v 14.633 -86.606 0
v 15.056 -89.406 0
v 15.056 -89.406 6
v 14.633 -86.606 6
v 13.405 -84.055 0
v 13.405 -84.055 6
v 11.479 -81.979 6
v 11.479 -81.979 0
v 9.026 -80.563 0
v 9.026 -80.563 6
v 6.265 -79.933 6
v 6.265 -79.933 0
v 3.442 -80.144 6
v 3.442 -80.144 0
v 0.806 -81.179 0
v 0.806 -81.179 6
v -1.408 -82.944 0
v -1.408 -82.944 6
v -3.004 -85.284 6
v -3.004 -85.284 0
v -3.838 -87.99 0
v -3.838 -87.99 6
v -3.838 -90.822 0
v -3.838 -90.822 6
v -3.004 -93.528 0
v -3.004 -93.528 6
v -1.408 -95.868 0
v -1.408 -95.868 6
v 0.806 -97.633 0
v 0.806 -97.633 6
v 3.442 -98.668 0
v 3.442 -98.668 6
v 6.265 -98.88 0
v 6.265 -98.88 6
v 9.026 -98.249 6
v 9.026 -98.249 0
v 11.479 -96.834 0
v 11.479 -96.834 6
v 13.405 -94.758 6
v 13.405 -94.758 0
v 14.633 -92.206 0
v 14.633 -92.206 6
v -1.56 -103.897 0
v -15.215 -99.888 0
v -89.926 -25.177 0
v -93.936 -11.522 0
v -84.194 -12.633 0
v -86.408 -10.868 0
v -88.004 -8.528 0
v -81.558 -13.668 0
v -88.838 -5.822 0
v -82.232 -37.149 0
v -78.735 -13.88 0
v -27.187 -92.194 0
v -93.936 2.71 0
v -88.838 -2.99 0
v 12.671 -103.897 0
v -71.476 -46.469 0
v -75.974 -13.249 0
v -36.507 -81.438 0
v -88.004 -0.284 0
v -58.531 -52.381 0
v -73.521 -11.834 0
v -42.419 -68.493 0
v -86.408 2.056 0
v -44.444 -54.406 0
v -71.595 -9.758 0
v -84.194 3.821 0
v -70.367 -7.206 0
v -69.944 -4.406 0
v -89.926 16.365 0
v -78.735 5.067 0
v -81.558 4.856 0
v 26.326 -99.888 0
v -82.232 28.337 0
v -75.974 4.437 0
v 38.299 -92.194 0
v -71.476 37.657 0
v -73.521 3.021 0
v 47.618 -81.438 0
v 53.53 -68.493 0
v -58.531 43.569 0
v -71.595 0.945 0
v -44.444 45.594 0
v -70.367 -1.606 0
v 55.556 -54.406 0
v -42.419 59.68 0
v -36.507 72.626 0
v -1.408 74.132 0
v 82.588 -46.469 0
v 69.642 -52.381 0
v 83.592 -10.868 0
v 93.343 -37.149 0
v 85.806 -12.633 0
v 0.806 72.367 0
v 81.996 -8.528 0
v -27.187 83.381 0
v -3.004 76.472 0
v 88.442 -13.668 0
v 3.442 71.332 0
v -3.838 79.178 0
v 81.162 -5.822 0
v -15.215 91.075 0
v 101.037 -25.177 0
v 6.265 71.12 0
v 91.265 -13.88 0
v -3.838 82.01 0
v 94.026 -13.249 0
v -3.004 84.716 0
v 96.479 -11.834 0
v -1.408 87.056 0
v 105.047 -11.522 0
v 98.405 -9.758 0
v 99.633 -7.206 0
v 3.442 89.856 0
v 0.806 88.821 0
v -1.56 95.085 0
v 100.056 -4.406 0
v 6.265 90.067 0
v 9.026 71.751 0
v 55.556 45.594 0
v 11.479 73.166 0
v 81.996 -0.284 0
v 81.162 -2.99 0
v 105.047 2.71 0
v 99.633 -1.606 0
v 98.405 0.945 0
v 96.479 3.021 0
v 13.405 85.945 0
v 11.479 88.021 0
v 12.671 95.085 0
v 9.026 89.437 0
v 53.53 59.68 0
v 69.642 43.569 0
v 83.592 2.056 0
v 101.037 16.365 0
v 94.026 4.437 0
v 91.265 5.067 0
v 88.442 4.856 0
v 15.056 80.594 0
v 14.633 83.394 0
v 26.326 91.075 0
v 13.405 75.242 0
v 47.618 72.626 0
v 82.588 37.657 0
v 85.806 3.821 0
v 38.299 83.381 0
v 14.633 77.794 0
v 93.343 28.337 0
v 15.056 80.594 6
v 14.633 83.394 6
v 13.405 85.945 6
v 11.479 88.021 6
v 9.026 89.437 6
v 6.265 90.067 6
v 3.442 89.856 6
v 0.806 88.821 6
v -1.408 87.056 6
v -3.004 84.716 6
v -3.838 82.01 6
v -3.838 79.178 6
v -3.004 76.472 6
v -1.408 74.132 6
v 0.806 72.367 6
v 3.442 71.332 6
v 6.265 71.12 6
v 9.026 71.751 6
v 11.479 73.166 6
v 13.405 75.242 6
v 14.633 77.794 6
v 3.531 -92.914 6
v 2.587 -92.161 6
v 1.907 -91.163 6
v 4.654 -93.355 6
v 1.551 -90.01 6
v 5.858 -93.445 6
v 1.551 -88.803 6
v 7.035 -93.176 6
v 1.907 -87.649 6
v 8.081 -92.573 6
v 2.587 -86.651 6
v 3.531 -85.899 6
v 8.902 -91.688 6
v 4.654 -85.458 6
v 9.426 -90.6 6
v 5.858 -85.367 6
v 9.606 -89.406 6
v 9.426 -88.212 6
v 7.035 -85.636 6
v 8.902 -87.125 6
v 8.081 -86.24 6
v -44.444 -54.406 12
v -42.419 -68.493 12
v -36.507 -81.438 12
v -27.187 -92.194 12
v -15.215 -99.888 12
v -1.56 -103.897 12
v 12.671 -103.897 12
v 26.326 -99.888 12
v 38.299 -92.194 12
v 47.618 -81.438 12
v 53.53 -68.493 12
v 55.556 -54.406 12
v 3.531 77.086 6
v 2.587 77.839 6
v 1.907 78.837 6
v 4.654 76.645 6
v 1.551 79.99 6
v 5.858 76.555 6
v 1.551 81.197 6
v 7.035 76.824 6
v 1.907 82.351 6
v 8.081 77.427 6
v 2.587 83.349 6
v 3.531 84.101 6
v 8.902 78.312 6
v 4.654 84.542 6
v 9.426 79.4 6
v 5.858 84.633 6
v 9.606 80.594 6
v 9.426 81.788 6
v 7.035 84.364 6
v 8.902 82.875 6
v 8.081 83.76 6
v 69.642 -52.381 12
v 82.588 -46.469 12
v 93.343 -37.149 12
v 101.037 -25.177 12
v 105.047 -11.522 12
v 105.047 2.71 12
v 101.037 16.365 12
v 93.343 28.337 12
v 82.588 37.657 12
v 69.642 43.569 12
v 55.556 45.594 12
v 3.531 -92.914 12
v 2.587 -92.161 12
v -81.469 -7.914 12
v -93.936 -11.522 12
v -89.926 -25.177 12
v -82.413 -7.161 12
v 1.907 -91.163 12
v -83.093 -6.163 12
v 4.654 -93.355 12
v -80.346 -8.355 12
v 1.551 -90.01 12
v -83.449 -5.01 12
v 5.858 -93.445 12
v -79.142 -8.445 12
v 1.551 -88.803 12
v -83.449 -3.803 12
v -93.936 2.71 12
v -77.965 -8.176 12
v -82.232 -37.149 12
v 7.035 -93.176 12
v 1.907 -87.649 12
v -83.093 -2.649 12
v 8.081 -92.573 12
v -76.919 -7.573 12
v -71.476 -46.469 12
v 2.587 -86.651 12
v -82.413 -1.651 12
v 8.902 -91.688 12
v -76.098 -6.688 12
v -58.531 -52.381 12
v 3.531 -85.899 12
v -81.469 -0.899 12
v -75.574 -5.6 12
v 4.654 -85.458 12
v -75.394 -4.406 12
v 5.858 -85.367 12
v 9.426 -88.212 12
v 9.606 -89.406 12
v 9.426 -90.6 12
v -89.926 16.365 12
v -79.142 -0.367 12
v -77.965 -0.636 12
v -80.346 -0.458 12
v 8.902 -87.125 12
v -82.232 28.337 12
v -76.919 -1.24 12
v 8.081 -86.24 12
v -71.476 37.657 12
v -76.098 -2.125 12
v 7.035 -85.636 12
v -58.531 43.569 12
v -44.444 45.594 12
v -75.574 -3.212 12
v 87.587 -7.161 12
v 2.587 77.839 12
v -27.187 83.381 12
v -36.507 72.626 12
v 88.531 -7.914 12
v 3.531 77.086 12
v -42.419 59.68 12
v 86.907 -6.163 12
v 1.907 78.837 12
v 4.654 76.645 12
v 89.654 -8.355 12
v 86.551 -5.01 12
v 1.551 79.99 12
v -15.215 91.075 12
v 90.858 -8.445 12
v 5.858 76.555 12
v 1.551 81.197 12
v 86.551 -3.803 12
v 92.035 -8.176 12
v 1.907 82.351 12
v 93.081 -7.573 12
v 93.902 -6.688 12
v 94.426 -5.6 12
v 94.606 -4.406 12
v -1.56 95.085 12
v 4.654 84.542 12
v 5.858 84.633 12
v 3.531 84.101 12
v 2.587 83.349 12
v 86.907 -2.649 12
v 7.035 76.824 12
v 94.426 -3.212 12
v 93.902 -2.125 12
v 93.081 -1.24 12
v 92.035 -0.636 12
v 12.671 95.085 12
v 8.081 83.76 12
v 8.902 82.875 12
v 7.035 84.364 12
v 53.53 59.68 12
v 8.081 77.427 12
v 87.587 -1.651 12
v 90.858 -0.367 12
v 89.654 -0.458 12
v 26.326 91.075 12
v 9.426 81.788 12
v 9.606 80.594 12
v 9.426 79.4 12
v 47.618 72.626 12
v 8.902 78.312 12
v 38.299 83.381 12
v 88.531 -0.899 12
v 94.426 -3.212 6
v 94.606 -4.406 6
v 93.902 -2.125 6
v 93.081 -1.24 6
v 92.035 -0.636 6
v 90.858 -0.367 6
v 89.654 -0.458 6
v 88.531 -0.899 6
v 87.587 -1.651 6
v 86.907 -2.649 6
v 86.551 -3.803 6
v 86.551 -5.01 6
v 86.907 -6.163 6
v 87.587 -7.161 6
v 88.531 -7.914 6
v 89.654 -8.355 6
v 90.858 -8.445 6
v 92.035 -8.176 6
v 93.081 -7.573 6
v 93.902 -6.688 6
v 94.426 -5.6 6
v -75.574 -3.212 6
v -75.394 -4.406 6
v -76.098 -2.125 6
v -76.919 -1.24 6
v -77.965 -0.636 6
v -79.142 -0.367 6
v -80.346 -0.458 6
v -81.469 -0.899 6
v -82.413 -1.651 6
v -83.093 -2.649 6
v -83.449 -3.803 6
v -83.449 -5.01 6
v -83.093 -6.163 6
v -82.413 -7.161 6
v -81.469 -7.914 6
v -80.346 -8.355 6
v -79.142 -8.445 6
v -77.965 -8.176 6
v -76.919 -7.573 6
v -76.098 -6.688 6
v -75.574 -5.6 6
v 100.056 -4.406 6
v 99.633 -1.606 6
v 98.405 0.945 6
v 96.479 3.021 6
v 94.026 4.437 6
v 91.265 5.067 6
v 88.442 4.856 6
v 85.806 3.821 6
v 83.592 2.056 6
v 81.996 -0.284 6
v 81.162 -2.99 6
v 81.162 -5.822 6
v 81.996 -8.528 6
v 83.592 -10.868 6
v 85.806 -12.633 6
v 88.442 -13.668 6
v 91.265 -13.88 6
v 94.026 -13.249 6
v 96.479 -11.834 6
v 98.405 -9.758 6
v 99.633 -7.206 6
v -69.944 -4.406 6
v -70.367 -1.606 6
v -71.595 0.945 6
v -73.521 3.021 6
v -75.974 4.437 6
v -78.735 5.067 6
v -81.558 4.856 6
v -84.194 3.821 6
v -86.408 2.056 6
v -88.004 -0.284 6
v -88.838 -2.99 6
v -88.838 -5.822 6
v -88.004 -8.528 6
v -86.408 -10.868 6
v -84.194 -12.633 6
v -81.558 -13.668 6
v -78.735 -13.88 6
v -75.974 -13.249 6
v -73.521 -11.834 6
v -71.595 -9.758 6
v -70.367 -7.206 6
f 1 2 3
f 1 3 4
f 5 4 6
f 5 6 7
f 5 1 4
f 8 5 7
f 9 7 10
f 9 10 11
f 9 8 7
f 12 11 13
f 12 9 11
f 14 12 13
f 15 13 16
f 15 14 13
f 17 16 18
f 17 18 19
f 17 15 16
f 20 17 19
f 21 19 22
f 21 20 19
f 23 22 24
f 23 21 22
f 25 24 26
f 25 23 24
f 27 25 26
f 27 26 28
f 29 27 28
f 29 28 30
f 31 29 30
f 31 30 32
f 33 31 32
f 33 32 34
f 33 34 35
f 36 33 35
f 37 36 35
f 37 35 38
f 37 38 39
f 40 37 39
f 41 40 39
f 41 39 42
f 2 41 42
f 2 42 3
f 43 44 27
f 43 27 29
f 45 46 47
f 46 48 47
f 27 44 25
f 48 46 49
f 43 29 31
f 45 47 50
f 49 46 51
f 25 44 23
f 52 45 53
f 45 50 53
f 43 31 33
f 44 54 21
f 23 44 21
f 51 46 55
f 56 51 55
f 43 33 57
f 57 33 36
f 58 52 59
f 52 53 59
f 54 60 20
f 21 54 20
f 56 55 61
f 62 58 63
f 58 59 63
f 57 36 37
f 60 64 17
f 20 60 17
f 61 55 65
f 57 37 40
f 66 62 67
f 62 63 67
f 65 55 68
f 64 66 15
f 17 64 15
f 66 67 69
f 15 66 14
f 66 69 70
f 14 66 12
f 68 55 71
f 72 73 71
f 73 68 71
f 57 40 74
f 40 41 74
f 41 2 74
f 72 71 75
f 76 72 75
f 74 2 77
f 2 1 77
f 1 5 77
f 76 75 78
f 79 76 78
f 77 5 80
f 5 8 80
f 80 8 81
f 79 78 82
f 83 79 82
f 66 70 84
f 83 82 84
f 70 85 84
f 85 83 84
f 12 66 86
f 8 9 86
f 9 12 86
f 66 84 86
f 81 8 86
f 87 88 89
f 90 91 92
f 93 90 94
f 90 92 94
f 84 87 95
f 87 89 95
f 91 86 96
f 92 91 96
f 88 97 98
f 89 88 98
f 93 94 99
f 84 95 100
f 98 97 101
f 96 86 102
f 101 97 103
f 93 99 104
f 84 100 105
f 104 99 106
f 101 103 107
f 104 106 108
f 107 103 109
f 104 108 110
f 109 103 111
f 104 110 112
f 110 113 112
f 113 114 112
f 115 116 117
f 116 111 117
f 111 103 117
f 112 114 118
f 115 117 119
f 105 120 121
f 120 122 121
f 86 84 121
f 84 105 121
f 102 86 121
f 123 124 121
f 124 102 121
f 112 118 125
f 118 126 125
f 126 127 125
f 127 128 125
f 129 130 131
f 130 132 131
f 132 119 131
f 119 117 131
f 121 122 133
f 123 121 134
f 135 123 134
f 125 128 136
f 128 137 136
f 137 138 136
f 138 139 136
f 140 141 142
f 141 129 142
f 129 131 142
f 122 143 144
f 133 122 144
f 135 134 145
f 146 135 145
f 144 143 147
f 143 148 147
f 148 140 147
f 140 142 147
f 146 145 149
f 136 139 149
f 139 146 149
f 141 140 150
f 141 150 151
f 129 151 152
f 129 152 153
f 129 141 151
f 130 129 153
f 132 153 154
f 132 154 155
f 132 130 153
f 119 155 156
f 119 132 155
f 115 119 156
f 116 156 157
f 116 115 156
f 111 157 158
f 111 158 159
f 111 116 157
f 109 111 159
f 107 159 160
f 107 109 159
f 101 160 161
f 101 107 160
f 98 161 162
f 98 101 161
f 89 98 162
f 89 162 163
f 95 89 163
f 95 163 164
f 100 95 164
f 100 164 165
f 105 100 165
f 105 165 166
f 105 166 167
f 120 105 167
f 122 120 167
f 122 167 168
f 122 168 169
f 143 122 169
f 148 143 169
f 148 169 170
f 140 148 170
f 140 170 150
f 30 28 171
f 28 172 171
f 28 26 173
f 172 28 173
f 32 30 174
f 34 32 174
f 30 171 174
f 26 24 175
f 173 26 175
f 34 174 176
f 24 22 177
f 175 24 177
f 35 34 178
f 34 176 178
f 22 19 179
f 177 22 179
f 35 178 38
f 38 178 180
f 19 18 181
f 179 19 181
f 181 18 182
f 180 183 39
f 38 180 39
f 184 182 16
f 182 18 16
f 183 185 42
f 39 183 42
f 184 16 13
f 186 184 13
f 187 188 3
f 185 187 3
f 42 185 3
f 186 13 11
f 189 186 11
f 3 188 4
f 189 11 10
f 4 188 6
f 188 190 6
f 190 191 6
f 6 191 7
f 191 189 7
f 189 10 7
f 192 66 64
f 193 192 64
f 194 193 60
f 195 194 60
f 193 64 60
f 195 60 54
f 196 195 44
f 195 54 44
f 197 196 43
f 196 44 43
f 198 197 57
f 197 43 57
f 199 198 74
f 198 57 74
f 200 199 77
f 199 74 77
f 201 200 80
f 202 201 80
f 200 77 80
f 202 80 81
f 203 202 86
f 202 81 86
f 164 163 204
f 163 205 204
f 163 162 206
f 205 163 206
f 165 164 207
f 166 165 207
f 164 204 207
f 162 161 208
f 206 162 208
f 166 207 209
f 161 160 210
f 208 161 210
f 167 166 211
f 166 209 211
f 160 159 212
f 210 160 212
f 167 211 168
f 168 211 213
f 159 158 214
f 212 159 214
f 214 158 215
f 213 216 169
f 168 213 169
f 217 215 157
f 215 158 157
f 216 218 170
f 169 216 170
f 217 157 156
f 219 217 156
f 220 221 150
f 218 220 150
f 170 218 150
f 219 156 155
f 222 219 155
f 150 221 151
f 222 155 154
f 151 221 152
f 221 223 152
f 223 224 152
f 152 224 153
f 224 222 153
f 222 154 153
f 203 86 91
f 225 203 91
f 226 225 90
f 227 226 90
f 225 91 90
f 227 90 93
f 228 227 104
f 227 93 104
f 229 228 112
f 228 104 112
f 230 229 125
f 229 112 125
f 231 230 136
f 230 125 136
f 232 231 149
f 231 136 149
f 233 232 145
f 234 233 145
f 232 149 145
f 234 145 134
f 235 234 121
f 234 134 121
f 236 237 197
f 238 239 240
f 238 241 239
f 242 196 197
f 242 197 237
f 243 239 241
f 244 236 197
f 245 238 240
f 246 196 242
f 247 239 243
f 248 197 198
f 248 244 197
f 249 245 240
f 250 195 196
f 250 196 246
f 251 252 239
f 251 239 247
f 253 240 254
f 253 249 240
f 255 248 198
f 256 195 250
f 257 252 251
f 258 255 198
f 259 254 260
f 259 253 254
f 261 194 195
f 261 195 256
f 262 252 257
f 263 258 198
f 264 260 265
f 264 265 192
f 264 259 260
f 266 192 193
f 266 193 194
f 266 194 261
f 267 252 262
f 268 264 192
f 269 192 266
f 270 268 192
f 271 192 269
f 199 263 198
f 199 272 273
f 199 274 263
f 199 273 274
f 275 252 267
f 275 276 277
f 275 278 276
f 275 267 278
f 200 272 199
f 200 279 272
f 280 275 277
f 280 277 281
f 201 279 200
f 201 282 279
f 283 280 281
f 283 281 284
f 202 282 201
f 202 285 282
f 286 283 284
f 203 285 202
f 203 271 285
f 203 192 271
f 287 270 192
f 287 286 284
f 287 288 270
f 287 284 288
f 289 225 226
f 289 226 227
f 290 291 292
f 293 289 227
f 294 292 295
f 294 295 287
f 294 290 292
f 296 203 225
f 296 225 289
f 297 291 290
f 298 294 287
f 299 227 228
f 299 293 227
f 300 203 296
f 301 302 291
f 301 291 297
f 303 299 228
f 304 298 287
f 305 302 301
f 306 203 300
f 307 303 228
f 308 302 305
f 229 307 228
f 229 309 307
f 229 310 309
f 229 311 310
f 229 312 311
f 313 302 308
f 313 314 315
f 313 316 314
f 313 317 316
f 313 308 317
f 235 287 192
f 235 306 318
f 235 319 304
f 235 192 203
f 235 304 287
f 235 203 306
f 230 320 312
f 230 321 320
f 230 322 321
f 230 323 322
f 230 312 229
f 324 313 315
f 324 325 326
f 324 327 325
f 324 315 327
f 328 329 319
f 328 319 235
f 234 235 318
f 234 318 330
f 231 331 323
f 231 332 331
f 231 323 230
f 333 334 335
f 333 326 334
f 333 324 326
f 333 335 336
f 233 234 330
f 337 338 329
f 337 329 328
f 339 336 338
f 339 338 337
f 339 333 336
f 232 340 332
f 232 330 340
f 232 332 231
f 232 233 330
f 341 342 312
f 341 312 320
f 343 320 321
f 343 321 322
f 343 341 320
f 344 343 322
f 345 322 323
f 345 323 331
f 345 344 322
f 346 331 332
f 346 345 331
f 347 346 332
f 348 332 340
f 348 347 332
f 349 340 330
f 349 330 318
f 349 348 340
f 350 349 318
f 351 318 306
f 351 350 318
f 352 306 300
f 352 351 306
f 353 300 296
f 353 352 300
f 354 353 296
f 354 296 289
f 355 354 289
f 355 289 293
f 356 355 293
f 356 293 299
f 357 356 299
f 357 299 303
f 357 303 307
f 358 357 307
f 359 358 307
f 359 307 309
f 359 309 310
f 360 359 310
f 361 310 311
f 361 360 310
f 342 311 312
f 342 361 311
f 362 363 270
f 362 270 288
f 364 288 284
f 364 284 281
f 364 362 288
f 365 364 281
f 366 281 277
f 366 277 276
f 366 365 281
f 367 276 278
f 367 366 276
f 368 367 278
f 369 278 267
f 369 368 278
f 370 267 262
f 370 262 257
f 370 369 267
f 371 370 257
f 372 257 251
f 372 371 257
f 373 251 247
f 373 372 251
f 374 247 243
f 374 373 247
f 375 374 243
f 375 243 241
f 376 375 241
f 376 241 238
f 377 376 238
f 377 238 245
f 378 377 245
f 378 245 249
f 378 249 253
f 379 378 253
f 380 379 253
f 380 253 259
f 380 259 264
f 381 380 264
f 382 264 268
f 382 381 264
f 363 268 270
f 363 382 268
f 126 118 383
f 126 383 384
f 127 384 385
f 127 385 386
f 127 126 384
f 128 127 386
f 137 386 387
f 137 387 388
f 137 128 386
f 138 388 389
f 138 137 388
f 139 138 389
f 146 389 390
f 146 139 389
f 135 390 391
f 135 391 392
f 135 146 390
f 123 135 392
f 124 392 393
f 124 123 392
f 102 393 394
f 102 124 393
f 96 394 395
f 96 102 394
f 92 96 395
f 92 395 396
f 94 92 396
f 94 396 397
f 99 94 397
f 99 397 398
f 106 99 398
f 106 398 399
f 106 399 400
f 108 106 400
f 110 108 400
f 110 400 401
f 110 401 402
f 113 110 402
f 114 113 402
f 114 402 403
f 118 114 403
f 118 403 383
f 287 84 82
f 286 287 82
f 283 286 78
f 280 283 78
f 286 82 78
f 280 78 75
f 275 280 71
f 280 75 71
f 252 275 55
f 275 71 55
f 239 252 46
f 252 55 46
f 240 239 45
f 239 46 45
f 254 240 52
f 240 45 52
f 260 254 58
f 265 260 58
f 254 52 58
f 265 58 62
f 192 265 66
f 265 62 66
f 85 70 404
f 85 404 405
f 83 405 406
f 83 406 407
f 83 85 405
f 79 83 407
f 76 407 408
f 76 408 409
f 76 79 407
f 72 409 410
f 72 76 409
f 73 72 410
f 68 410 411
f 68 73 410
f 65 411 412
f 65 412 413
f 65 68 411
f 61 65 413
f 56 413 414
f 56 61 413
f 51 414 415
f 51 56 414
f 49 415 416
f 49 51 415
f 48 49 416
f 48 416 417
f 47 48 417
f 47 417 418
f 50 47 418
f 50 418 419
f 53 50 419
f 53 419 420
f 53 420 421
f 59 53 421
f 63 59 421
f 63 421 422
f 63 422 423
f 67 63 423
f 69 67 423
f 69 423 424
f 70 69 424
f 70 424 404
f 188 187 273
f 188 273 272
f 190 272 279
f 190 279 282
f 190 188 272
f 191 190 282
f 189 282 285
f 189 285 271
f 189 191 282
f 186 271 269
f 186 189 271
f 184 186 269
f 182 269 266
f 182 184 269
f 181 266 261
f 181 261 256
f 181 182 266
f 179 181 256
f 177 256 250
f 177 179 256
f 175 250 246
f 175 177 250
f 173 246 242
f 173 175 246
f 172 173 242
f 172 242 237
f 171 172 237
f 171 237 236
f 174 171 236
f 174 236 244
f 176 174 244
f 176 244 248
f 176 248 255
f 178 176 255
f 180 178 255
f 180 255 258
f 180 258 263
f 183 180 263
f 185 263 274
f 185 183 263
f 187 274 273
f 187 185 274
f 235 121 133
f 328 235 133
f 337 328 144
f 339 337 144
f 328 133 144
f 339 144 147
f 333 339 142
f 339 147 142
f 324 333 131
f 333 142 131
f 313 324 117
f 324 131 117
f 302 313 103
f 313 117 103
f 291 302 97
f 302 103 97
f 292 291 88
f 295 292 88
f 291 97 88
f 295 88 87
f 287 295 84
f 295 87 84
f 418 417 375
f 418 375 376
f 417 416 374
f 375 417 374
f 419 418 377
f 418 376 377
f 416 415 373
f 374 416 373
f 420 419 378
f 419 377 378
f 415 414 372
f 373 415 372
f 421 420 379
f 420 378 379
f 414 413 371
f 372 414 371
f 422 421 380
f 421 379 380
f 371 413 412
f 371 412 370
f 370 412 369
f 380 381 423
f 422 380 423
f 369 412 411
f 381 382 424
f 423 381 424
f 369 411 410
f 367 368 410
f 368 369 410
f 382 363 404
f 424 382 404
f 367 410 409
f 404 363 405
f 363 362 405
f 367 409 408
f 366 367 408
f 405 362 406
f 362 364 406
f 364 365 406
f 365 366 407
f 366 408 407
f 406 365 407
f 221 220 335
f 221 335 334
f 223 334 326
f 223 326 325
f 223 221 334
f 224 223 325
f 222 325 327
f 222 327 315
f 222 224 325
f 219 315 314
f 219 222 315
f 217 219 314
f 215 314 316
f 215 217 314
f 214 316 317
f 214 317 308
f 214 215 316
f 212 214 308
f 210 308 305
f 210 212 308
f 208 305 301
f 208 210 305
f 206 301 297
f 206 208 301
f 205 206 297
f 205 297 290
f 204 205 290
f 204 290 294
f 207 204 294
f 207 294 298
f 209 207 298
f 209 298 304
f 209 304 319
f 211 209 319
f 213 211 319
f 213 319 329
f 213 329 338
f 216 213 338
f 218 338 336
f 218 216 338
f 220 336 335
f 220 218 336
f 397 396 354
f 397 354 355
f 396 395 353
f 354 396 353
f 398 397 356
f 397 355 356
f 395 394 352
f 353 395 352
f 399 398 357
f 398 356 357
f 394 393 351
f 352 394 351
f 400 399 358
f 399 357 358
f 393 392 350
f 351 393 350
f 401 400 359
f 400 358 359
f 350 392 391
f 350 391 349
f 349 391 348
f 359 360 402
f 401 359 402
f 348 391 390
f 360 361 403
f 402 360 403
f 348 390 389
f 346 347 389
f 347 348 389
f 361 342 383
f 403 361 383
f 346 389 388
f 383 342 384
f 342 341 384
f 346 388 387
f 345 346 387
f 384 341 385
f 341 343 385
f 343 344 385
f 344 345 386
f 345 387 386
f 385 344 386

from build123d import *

# Parameters (mm, degrees)
IZIM1_R                     = 9.5
Y_KSEKLIK_EKSTR_ZYON1_DEPTH = 12
Y_KSEKLIK_EKSTR_ZYON2_START = -6
IZIM2_R                     = 9.5
IZIM2_R_2                   = 4.05
Y_KSEKLIK_EKSTR_ZYON2_DEPTH = 6


with BuildPart() as part:
    # Çizim1 → Yükseklik-Ekstrüzyon1 (new body)
    with BuildSketch(Plane.XY):
        with BuildLine():
            ThreePointArc((55.555555556, 45.593869732), (5.555555556, 95.593869732), (-44.444444444, 45.593869732))
            ThreePointArc((-44.444444444, 45.593869732), (-94.444444444, -4.406130268), (-44.444444444, -54.406130268))
            ThreePointArc((-44.444444444, -54.406130268), (5.555555556, -104.406130268), (55.555555556, -54.406130268))
            ThreePointArc((55.555555556, -54.406130268), (105.555555556, -4.406130268), (55.555555556, 45.593869732))
        make_face()
        with Locations((-79.444444444, -4.406130268)):
            Circle(IZIM1_R, mode=Mode.SUBTRACT)
        with Locations((5.555555556, 80.593869732)):
            Circle(IZIM1_R, mode=Mode.SUBTRACT)
        with Locations((90.555555556, -4.406130268)):
            Circle(IZIM1_R, mode=Mode.SUBTRACT)
        with Locations((5.555555556, -89.406130268)):
            Circle(IZIM1_R, mode=Mode.SUBTRACT)
    extrude(amount=Y_KSEKLIK_EKSTR_ZYON1_DEPTH)

    # Çizim2 → Yükseklik-Ekstrüzyon2 (add)
    # profile 1 of 4: a face of its own
    with BuildSketch(Plane.XY.offset(12).offset(Y_KSEKLIK_EKSTR_ZYON2_START)):
        with Locations((5.555555556, 80.593869732)):
            Circle(IZIM2_R)
        with Locations((5.555555556, 80.593869732)):
            Circle(IZIM2_R_2, mode=Mode.SUBTRACT)
    # profile 2 of 4: a face of its own
    with BuildSketch(Plane.XY.offset(12).offset(Y_KSEKLIK_EKSTR_ZYON2_START)):
        with Locations((90.555555556, -4.406130268)):
            Circle(IZIM2_R)
        with Locations((90.555555556, -4.406130268)):
            Circle(IZIM2_R_2, mode=Mode.SUBTRACT)
    # profile 3 of 4: a face of its own
    with BuildSketch(Plane.XY.offset(12).offset(Y_KSEKLIK_EKSTR_ZYON2_START)):
        with Locations((5.555555556, -89.406130268)):
            Circle(IZIM2_R)
        with Locations((5.555555556, -89.406130268)):
            Circle(IZIM2_R_2, mode=Mode.SUBTRACT)
    # profile 4 of 4: a face of its own
    with BuildSketch(Plane.XY.offset(12).offset(Y_KSEKLIK_EKSTR_ZYON2_START)):
        with Locations((-79.444444444, -4.406130268)):
            Circle(IZIM2_R)
        with Locations((-79.444444444, -4.406130268)):
            Circle(IZIM2_R_2, mode=Mode.SUBTRACT)
    extrude(amount=Y_KSEKLIK_EKSTR_ZYON2_DEPTH)


solid = part.part
